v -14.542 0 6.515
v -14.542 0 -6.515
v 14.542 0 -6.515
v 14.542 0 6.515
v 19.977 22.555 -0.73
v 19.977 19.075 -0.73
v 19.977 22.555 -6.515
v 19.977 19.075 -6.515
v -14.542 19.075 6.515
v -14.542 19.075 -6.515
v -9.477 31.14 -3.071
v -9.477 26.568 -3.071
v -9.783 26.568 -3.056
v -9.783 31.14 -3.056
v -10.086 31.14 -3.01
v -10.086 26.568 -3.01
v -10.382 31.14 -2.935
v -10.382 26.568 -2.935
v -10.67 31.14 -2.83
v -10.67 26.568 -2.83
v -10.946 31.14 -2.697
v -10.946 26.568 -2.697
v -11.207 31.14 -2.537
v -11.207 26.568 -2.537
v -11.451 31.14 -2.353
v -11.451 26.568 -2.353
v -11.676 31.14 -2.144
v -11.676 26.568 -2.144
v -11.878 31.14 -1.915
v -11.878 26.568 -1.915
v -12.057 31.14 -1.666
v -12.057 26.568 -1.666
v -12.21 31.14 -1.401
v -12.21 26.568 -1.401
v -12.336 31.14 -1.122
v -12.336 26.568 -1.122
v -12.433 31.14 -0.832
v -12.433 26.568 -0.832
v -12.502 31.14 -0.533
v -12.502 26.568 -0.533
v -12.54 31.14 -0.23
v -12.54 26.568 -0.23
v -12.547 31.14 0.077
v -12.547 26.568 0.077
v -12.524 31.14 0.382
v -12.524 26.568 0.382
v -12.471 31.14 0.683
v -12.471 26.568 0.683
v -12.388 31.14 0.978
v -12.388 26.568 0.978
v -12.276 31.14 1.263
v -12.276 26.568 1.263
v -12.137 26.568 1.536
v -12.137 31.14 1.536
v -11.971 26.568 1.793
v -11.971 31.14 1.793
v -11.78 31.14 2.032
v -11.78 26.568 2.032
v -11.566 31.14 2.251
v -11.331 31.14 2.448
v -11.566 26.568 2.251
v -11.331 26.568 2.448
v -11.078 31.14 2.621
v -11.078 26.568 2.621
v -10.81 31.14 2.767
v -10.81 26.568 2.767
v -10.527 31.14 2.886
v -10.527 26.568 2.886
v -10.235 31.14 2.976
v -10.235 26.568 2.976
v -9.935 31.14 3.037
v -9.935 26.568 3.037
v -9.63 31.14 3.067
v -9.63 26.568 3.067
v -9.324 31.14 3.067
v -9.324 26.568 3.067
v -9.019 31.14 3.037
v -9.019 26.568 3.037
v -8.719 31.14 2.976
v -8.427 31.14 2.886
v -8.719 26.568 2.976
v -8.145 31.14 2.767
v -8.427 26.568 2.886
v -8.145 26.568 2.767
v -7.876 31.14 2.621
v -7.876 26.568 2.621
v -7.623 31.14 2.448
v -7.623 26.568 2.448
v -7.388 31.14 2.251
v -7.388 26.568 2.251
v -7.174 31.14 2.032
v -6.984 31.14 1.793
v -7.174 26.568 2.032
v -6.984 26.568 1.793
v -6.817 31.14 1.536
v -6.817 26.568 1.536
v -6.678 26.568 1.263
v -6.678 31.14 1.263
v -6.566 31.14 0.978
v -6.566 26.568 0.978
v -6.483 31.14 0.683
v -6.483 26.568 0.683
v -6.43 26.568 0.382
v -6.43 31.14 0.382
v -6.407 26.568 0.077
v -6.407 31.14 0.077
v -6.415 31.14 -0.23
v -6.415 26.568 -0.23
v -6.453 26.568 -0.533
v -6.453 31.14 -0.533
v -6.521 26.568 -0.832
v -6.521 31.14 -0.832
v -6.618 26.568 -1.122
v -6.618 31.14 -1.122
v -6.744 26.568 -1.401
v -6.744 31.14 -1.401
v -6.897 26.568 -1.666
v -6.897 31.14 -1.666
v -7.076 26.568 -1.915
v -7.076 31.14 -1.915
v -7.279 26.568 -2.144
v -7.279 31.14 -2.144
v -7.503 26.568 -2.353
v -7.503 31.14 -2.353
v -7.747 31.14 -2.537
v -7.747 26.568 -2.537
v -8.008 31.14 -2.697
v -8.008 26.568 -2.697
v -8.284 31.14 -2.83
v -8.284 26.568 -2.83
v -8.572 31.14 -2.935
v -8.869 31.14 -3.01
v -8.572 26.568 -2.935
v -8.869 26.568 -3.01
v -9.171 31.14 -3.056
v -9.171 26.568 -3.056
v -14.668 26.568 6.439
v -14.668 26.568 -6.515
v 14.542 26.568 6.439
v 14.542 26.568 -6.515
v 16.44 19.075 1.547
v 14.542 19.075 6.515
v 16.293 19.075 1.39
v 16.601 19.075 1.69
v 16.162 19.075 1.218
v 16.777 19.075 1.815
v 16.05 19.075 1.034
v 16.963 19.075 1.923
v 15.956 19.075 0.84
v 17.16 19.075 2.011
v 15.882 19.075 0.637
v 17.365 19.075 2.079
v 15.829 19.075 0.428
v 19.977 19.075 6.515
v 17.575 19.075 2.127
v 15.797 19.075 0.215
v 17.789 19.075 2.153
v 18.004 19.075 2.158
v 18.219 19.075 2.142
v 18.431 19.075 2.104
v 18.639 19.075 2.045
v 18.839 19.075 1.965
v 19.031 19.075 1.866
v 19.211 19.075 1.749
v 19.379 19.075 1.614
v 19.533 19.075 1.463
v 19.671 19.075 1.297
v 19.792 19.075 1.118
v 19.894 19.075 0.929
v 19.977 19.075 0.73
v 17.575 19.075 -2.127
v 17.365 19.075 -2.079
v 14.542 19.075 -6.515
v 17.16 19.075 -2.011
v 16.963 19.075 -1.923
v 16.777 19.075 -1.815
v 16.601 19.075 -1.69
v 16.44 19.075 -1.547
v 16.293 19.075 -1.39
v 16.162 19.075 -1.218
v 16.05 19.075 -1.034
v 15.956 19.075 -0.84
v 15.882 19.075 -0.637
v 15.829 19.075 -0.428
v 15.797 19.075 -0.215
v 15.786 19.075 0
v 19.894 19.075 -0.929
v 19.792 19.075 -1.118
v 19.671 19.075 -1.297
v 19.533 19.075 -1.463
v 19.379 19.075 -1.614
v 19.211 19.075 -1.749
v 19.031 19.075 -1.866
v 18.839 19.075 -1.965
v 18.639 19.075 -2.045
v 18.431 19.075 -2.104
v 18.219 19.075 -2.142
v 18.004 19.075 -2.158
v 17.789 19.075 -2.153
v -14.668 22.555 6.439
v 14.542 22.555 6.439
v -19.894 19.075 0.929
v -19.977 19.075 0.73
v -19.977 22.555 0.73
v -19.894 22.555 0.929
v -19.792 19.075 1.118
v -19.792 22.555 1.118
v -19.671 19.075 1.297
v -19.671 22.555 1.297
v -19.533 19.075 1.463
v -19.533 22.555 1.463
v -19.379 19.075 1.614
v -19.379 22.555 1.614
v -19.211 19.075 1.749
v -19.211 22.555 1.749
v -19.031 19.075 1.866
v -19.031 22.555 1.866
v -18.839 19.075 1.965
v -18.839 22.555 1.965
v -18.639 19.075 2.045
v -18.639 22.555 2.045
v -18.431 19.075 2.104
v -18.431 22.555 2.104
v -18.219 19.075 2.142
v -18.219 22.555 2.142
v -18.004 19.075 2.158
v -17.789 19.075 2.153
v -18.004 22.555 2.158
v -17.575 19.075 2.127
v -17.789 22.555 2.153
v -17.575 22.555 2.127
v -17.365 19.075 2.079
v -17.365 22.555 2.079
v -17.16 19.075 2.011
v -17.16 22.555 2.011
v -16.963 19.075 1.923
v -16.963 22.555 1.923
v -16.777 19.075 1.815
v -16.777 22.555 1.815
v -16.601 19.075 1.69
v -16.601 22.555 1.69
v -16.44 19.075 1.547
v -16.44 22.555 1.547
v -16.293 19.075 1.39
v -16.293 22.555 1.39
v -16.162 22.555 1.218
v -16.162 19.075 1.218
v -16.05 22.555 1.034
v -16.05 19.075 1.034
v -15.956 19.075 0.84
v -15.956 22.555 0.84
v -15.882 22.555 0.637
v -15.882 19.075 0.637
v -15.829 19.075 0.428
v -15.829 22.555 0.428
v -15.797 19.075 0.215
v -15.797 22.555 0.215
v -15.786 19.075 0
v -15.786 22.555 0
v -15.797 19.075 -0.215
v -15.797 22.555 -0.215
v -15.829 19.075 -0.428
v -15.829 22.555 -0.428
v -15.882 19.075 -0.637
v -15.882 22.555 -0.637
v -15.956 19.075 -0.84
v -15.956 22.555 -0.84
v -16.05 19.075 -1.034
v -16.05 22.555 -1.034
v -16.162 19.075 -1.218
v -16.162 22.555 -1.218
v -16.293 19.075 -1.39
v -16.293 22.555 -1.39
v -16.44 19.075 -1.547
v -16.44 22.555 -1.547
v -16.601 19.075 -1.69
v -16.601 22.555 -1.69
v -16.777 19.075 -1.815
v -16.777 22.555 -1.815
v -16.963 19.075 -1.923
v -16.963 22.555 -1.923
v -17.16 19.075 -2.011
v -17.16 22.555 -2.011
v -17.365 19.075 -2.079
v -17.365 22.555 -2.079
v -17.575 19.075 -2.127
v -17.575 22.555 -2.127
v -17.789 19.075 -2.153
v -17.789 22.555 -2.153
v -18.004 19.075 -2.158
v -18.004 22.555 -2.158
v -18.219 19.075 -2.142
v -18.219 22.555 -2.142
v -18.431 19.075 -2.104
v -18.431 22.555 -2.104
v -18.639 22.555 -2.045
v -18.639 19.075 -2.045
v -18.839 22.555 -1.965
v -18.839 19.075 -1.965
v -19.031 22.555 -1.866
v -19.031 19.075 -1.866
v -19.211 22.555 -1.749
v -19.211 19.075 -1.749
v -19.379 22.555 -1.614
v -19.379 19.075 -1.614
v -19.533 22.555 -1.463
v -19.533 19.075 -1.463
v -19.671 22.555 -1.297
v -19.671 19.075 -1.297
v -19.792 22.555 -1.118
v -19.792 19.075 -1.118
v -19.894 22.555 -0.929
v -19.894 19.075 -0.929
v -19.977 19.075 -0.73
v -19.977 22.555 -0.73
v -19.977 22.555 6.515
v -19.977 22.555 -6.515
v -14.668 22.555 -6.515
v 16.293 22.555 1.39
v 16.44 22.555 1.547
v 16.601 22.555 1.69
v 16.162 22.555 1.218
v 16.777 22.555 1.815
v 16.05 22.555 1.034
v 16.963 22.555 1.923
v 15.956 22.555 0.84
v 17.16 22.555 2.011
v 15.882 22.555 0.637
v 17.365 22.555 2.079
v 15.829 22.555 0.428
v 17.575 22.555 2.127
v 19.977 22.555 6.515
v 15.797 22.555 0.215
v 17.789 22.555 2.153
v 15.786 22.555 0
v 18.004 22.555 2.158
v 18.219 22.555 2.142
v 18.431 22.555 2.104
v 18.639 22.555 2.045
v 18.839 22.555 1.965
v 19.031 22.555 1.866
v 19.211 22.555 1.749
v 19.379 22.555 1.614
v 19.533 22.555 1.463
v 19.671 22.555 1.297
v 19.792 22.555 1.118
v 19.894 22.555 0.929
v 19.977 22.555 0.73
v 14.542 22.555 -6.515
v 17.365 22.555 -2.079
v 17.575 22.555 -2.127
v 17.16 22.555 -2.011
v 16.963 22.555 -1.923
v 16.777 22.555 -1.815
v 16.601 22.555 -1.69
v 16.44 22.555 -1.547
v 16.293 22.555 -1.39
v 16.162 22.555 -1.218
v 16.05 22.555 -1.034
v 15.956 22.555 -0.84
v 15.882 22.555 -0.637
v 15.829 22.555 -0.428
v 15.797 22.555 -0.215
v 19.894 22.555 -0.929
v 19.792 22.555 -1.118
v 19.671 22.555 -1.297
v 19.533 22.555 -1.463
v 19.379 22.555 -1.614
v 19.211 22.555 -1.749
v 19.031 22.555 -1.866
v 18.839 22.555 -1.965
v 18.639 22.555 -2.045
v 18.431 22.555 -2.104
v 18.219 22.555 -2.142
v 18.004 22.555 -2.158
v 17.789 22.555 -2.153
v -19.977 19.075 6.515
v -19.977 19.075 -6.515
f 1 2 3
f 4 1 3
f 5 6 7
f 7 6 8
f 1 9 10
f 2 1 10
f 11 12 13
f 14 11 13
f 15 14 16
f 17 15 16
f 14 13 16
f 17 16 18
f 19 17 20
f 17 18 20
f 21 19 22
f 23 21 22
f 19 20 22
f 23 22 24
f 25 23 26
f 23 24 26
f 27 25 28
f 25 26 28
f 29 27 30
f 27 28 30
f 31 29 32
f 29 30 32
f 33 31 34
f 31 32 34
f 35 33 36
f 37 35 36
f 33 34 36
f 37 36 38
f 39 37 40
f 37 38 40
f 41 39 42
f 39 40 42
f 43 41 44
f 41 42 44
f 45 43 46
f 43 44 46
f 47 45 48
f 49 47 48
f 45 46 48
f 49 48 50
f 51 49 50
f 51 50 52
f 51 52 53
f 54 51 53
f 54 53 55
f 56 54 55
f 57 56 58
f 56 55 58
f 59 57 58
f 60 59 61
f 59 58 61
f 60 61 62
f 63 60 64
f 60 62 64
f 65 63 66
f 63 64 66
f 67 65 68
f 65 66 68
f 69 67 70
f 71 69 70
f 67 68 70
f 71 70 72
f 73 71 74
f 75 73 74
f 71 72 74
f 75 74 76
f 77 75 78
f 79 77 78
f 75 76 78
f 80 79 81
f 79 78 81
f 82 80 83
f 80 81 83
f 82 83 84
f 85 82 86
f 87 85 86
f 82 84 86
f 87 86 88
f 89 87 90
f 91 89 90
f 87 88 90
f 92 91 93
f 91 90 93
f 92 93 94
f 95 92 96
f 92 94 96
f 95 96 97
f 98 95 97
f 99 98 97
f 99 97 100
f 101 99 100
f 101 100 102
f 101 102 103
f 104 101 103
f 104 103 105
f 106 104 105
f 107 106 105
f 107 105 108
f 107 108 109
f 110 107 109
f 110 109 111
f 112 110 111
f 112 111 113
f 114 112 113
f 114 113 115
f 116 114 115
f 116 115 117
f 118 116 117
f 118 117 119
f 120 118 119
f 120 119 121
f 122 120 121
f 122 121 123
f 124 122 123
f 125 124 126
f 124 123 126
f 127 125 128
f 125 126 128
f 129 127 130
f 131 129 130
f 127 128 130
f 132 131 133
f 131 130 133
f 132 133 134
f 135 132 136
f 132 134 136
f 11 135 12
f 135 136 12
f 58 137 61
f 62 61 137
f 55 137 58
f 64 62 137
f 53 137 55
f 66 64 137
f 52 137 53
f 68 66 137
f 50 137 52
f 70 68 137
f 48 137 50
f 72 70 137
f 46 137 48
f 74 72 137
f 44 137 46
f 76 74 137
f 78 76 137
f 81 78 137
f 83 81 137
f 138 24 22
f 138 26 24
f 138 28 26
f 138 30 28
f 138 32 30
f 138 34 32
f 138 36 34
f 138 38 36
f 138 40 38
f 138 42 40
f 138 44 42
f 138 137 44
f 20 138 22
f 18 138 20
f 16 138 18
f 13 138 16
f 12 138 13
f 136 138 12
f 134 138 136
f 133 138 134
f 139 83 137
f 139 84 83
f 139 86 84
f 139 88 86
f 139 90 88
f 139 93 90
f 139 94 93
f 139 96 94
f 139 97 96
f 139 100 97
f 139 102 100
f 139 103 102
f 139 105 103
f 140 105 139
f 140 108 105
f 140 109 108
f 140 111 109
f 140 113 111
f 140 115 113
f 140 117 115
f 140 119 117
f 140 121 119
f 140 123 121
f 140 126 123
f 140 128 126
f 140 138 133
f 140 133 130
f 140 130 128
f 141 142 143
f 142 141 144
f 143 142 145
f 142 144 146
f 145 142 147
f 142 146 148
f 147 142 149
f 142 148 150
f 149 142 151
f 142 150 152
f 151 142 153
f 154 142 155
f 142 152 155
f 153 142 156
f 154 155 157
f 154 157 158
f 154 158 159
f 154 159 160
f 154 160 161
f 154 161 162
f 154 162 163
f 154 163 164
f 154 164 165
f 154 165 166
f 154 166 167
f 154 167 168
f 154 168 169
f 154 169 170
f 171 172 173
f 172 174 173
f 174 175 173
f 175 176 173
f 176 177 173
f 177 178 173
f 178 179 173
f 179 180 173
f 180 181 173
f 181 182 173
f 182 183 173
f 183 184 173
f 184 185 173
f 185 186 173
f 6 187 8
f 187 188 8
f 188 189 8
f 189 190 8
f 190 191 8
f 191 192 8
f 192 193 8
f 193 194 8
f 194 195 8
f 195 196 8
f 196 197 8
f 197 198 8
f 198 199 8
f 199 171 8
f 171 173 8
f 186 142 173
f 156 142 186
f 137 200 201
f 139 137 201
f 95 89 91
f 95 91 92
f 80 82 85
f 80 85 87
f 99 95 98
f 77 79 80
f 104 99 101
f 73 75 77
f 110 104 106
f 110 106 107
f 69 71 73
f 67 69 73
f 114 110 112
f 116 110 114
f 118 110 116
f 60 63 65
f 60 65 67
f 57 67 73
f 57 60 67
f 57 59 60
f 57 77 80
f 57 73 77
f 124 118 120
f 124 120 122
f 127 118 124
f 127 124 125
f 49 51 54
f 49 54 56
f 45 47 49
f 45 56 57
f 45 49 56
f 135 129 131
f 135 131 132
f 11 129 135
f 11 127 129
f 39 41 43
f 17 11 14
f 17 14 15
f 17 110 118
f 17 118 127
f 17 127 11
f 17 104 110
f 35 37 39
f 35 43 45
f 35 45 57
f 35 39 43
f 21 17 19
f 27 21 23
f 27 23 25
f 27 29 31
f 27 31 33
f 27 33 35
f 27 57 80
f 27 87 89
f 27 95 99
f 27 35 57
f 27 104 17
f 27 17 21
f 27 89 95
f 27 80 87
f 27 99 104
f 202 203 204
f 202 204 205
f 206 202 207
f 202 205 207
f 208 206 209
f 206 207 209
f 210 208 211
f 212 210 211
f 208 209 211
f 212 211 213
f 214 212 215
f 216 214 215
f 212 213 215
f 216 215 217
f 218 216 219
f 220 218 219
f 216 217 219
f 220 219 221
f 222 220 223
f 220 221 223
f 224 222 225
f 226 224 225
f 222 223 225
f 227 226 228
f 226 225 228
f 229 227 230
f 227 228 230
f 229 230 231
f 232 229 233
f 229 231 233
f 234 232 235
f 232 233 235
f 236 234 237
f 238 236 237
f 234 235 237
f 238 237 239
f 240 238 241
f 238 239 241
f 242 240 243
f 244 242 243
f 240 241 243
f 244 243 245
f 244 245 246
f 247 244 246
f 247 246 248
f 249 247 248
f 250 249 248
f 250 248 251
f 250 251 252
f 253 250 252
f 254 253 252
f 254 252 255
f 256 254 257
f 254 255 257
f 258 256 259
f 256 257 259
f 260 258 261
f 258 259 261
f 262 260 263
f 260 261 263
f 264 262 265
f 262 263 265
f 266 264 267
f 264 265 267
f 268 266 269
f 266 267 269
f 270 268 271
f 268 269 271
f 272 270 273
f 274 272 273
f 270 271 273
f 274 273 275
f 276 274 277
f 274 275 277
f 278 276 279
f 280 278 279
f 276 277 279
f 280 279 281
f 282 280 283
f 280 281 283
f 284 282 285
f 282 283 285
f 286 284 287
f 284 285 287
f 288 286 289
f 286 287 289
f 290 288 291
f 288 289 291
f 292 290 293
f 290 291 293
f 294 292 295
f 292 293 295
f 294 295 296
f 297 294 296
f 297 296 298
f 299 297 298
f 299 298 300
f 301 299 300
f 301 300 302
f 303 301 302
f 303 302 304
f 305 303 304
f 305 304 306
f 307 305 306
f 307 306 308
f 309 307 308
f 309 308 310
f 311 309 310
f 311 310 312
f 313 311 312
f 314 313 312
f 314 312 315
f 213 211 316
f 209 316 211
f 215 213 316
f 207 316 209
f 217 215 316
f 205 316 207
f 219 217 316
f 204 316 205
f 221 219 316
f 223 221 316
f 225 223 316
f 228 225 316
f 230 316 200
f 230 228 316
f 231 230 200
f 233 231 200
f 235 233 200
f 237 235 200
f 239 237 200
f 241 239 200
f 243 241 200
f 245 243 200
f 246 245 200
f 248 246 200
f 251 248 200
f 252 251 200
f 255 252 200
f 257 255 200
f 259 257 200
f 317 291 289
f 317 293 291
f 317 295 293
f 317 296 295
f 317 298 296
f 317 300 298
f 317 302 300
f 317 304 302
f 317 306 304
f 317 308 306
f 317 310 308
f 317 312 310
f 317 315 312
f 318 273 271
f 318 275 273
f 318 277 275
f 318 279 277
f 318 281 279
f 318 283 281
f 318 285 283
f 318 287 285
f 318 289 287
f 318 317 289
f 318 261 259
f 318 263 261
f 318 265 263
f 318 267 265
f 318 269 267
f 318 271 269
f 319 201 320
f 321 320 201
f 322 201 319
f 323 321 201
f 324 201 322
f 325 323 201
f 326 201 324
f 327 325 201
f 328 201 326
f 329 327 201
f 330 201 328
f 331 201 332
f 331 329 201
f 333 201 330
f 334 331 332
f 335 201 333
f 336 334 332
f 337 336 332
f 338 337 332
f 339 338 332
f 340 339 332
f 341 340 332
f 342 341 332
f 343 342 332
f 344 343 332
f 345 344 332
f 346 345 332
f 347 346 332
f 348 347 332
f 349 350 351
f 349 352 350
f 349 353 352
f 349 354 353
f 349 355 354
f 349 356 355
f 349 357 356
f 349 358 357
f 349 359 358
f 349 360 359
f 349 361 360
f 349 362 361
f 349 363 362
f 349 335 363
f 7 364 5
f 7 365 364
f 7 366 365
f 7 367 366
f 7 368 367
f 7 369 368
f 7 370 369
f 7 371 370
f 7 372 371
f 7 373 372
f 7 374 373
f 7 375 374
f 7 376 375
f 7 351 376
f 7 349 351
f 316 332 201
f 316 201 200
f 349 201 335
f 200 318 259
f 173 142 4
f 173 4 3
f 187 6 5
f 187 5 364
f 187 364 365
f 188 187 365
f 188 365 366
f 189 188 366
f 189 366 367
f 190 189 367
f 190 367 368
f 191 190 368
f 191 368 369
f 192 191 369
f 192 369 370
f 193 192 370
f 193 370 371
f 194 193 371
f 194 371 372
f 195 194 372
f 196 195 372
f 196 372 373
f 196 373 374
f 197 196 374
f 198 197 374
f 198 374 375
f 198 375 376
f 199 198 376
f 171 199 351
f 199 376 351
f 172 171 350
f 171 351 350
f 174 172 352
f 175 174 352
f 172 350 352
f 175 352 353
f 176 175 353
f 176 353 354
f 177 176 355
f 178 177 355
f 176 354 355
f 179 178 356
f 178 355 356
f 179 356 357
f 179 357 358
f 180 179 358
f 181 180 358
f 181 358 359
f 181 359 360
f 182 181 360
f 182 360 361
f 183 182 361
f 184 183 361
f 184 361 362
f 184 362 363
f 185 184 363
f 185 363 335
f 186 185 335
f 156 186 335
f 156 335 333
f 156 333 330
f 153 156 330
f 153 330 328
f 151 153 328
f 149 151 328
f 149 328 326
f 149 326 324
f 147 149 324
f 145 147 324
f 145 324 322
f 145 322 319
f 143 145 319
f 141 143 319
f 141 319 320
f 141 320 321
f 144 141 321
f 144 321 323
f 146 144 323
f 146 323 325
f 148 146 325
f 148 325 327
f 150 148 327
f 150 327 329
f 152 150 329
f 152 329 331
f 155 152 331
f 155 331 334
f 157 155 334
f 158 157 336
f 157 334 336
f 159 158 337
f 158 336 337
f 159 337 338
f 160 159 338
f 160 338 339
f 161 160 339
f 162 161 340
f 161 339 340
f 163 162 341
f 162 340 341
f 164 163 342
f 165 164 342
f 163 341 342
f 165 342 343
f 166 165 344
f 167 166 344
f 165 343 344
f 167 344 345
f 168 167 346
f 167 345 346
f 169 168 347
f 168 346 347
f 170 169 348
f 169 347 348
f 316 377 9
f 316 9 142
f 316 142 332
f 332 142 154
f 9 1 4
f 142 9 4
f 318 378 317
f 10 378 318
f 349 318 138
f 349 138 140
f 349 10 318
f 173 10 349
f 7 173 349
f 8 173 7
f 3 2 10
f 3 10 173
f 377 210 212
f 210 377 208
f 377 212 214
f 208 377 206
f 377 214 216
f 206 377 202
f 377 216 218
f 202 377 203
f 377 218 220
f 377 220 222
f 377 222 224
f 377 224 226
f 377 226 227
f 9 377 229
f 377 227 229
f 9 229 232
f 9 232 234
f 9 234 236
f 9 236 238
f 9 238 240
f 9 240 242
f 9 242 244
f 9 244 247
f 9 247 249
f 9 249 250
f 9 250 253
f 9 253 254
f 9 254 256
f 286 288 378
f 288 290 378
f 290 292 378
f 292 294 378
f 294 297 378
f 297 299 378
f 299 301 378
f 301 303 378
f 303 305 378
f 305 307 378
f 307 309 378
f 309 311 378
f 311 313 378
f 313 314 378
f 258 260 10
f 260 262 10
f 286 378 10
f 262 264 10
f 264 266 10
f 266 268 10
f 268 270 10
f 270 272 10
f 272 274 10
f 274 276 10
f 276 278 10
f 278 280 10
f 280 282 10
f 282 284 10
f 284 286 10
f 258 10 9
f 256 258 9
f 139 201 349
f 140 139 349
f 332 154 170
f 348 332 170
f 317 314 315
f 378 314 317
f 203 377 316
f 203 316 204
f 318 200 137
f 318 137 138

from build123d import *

# Parameters (mm, degrees)
SKETCH1_W           = 29.083
SKETCH1_H           = 13.0302
BOSS_EXTRUDE1_DEPTH = 19.0754
SKETCH2_W           = 39.9542
SKETCH2_H           = 13.0302
BOSS_EXTRUDE2_DEPTH = 3.4798
SKETCH3_W           = 29.21
SKETCH3_H           = 12.954
BOSS_EXTRUDE3_DEPTH = 4.0132
SKETCH4_R           = 3.071074645
BOSS_EXTRUDE4_DEPTH = 4.572
SKETCH5_R           = 2.159
CUT_EXTRUDE1_DEPTH  = 3.4798


with BuildPart() as part:
    # Sketch1 → Boss-Extrude1 (new body)
    with BuildSketch(Plane(origin=(0, 0, 0), x_dir=(1, 0, 0), z_dir=(0, 1, 0))):
        Rectangle(SKETCH1_W, SKETCH1_H)
    extrude(amount=BOSS_EXTRUDE1_DEPTH)

    # Sketch2 → Boss-Extrude2 (add)
    with BuildSketch(Plane(origin=(0, 19.0754, 0), x_dir=(1, 0, 0), z_dir=(0, 1, 0))):
        Rectangle(SKETCH2_W, SKETCH2_H)
    extrude(amount=BOSS_EXTRUDE2_DEPTH)

    # Sketch3 → Boss-Extrude3 (add)
    with BuildSketch(Plane(origin=(0, 22.5552, 0), x_dir=(1, 0, 0), z_dir=(0, 1, 0))):
        with Locations((-0.0635, 0.0381)):
            Rectangle(SKETCH3_W, SKETCH3_H)
    extrude(amount=BOSS_EXTRUDE3_DEPTH)

    # Sketch4 → Boss-Extrude4 (add)
    with BuildSketch(Plane(origin=(0, 26.5684, 0), x_dir=(1, 0, 0), z_dir=(0, 1, 0))):
        with Locations(Location((-9.4771, 0, 0), (0, 0, 90))):
            Circle(SKETCH4_R)
    extrude(amount=BOSS_EXTRUDE4_DEPTH)

    # Sketch5 → Cut-Extrude1 (cut)
    with BuildSketch(Plane(origin=(0, 22.5552, 0), x_dir=(1, 0, 0), z_dir=(0, 1, 0))):
        with Locations((-17.9451, 0)):
            Circle(SKETCH5_R)
        with Locations((17.9451, 0)):
            Circle(SKETCH5_R)
    extrude(amount=-CUT_EXTRUDE1_DEPTH, mode=Mode.SUBTRACT)


solid = part.part
